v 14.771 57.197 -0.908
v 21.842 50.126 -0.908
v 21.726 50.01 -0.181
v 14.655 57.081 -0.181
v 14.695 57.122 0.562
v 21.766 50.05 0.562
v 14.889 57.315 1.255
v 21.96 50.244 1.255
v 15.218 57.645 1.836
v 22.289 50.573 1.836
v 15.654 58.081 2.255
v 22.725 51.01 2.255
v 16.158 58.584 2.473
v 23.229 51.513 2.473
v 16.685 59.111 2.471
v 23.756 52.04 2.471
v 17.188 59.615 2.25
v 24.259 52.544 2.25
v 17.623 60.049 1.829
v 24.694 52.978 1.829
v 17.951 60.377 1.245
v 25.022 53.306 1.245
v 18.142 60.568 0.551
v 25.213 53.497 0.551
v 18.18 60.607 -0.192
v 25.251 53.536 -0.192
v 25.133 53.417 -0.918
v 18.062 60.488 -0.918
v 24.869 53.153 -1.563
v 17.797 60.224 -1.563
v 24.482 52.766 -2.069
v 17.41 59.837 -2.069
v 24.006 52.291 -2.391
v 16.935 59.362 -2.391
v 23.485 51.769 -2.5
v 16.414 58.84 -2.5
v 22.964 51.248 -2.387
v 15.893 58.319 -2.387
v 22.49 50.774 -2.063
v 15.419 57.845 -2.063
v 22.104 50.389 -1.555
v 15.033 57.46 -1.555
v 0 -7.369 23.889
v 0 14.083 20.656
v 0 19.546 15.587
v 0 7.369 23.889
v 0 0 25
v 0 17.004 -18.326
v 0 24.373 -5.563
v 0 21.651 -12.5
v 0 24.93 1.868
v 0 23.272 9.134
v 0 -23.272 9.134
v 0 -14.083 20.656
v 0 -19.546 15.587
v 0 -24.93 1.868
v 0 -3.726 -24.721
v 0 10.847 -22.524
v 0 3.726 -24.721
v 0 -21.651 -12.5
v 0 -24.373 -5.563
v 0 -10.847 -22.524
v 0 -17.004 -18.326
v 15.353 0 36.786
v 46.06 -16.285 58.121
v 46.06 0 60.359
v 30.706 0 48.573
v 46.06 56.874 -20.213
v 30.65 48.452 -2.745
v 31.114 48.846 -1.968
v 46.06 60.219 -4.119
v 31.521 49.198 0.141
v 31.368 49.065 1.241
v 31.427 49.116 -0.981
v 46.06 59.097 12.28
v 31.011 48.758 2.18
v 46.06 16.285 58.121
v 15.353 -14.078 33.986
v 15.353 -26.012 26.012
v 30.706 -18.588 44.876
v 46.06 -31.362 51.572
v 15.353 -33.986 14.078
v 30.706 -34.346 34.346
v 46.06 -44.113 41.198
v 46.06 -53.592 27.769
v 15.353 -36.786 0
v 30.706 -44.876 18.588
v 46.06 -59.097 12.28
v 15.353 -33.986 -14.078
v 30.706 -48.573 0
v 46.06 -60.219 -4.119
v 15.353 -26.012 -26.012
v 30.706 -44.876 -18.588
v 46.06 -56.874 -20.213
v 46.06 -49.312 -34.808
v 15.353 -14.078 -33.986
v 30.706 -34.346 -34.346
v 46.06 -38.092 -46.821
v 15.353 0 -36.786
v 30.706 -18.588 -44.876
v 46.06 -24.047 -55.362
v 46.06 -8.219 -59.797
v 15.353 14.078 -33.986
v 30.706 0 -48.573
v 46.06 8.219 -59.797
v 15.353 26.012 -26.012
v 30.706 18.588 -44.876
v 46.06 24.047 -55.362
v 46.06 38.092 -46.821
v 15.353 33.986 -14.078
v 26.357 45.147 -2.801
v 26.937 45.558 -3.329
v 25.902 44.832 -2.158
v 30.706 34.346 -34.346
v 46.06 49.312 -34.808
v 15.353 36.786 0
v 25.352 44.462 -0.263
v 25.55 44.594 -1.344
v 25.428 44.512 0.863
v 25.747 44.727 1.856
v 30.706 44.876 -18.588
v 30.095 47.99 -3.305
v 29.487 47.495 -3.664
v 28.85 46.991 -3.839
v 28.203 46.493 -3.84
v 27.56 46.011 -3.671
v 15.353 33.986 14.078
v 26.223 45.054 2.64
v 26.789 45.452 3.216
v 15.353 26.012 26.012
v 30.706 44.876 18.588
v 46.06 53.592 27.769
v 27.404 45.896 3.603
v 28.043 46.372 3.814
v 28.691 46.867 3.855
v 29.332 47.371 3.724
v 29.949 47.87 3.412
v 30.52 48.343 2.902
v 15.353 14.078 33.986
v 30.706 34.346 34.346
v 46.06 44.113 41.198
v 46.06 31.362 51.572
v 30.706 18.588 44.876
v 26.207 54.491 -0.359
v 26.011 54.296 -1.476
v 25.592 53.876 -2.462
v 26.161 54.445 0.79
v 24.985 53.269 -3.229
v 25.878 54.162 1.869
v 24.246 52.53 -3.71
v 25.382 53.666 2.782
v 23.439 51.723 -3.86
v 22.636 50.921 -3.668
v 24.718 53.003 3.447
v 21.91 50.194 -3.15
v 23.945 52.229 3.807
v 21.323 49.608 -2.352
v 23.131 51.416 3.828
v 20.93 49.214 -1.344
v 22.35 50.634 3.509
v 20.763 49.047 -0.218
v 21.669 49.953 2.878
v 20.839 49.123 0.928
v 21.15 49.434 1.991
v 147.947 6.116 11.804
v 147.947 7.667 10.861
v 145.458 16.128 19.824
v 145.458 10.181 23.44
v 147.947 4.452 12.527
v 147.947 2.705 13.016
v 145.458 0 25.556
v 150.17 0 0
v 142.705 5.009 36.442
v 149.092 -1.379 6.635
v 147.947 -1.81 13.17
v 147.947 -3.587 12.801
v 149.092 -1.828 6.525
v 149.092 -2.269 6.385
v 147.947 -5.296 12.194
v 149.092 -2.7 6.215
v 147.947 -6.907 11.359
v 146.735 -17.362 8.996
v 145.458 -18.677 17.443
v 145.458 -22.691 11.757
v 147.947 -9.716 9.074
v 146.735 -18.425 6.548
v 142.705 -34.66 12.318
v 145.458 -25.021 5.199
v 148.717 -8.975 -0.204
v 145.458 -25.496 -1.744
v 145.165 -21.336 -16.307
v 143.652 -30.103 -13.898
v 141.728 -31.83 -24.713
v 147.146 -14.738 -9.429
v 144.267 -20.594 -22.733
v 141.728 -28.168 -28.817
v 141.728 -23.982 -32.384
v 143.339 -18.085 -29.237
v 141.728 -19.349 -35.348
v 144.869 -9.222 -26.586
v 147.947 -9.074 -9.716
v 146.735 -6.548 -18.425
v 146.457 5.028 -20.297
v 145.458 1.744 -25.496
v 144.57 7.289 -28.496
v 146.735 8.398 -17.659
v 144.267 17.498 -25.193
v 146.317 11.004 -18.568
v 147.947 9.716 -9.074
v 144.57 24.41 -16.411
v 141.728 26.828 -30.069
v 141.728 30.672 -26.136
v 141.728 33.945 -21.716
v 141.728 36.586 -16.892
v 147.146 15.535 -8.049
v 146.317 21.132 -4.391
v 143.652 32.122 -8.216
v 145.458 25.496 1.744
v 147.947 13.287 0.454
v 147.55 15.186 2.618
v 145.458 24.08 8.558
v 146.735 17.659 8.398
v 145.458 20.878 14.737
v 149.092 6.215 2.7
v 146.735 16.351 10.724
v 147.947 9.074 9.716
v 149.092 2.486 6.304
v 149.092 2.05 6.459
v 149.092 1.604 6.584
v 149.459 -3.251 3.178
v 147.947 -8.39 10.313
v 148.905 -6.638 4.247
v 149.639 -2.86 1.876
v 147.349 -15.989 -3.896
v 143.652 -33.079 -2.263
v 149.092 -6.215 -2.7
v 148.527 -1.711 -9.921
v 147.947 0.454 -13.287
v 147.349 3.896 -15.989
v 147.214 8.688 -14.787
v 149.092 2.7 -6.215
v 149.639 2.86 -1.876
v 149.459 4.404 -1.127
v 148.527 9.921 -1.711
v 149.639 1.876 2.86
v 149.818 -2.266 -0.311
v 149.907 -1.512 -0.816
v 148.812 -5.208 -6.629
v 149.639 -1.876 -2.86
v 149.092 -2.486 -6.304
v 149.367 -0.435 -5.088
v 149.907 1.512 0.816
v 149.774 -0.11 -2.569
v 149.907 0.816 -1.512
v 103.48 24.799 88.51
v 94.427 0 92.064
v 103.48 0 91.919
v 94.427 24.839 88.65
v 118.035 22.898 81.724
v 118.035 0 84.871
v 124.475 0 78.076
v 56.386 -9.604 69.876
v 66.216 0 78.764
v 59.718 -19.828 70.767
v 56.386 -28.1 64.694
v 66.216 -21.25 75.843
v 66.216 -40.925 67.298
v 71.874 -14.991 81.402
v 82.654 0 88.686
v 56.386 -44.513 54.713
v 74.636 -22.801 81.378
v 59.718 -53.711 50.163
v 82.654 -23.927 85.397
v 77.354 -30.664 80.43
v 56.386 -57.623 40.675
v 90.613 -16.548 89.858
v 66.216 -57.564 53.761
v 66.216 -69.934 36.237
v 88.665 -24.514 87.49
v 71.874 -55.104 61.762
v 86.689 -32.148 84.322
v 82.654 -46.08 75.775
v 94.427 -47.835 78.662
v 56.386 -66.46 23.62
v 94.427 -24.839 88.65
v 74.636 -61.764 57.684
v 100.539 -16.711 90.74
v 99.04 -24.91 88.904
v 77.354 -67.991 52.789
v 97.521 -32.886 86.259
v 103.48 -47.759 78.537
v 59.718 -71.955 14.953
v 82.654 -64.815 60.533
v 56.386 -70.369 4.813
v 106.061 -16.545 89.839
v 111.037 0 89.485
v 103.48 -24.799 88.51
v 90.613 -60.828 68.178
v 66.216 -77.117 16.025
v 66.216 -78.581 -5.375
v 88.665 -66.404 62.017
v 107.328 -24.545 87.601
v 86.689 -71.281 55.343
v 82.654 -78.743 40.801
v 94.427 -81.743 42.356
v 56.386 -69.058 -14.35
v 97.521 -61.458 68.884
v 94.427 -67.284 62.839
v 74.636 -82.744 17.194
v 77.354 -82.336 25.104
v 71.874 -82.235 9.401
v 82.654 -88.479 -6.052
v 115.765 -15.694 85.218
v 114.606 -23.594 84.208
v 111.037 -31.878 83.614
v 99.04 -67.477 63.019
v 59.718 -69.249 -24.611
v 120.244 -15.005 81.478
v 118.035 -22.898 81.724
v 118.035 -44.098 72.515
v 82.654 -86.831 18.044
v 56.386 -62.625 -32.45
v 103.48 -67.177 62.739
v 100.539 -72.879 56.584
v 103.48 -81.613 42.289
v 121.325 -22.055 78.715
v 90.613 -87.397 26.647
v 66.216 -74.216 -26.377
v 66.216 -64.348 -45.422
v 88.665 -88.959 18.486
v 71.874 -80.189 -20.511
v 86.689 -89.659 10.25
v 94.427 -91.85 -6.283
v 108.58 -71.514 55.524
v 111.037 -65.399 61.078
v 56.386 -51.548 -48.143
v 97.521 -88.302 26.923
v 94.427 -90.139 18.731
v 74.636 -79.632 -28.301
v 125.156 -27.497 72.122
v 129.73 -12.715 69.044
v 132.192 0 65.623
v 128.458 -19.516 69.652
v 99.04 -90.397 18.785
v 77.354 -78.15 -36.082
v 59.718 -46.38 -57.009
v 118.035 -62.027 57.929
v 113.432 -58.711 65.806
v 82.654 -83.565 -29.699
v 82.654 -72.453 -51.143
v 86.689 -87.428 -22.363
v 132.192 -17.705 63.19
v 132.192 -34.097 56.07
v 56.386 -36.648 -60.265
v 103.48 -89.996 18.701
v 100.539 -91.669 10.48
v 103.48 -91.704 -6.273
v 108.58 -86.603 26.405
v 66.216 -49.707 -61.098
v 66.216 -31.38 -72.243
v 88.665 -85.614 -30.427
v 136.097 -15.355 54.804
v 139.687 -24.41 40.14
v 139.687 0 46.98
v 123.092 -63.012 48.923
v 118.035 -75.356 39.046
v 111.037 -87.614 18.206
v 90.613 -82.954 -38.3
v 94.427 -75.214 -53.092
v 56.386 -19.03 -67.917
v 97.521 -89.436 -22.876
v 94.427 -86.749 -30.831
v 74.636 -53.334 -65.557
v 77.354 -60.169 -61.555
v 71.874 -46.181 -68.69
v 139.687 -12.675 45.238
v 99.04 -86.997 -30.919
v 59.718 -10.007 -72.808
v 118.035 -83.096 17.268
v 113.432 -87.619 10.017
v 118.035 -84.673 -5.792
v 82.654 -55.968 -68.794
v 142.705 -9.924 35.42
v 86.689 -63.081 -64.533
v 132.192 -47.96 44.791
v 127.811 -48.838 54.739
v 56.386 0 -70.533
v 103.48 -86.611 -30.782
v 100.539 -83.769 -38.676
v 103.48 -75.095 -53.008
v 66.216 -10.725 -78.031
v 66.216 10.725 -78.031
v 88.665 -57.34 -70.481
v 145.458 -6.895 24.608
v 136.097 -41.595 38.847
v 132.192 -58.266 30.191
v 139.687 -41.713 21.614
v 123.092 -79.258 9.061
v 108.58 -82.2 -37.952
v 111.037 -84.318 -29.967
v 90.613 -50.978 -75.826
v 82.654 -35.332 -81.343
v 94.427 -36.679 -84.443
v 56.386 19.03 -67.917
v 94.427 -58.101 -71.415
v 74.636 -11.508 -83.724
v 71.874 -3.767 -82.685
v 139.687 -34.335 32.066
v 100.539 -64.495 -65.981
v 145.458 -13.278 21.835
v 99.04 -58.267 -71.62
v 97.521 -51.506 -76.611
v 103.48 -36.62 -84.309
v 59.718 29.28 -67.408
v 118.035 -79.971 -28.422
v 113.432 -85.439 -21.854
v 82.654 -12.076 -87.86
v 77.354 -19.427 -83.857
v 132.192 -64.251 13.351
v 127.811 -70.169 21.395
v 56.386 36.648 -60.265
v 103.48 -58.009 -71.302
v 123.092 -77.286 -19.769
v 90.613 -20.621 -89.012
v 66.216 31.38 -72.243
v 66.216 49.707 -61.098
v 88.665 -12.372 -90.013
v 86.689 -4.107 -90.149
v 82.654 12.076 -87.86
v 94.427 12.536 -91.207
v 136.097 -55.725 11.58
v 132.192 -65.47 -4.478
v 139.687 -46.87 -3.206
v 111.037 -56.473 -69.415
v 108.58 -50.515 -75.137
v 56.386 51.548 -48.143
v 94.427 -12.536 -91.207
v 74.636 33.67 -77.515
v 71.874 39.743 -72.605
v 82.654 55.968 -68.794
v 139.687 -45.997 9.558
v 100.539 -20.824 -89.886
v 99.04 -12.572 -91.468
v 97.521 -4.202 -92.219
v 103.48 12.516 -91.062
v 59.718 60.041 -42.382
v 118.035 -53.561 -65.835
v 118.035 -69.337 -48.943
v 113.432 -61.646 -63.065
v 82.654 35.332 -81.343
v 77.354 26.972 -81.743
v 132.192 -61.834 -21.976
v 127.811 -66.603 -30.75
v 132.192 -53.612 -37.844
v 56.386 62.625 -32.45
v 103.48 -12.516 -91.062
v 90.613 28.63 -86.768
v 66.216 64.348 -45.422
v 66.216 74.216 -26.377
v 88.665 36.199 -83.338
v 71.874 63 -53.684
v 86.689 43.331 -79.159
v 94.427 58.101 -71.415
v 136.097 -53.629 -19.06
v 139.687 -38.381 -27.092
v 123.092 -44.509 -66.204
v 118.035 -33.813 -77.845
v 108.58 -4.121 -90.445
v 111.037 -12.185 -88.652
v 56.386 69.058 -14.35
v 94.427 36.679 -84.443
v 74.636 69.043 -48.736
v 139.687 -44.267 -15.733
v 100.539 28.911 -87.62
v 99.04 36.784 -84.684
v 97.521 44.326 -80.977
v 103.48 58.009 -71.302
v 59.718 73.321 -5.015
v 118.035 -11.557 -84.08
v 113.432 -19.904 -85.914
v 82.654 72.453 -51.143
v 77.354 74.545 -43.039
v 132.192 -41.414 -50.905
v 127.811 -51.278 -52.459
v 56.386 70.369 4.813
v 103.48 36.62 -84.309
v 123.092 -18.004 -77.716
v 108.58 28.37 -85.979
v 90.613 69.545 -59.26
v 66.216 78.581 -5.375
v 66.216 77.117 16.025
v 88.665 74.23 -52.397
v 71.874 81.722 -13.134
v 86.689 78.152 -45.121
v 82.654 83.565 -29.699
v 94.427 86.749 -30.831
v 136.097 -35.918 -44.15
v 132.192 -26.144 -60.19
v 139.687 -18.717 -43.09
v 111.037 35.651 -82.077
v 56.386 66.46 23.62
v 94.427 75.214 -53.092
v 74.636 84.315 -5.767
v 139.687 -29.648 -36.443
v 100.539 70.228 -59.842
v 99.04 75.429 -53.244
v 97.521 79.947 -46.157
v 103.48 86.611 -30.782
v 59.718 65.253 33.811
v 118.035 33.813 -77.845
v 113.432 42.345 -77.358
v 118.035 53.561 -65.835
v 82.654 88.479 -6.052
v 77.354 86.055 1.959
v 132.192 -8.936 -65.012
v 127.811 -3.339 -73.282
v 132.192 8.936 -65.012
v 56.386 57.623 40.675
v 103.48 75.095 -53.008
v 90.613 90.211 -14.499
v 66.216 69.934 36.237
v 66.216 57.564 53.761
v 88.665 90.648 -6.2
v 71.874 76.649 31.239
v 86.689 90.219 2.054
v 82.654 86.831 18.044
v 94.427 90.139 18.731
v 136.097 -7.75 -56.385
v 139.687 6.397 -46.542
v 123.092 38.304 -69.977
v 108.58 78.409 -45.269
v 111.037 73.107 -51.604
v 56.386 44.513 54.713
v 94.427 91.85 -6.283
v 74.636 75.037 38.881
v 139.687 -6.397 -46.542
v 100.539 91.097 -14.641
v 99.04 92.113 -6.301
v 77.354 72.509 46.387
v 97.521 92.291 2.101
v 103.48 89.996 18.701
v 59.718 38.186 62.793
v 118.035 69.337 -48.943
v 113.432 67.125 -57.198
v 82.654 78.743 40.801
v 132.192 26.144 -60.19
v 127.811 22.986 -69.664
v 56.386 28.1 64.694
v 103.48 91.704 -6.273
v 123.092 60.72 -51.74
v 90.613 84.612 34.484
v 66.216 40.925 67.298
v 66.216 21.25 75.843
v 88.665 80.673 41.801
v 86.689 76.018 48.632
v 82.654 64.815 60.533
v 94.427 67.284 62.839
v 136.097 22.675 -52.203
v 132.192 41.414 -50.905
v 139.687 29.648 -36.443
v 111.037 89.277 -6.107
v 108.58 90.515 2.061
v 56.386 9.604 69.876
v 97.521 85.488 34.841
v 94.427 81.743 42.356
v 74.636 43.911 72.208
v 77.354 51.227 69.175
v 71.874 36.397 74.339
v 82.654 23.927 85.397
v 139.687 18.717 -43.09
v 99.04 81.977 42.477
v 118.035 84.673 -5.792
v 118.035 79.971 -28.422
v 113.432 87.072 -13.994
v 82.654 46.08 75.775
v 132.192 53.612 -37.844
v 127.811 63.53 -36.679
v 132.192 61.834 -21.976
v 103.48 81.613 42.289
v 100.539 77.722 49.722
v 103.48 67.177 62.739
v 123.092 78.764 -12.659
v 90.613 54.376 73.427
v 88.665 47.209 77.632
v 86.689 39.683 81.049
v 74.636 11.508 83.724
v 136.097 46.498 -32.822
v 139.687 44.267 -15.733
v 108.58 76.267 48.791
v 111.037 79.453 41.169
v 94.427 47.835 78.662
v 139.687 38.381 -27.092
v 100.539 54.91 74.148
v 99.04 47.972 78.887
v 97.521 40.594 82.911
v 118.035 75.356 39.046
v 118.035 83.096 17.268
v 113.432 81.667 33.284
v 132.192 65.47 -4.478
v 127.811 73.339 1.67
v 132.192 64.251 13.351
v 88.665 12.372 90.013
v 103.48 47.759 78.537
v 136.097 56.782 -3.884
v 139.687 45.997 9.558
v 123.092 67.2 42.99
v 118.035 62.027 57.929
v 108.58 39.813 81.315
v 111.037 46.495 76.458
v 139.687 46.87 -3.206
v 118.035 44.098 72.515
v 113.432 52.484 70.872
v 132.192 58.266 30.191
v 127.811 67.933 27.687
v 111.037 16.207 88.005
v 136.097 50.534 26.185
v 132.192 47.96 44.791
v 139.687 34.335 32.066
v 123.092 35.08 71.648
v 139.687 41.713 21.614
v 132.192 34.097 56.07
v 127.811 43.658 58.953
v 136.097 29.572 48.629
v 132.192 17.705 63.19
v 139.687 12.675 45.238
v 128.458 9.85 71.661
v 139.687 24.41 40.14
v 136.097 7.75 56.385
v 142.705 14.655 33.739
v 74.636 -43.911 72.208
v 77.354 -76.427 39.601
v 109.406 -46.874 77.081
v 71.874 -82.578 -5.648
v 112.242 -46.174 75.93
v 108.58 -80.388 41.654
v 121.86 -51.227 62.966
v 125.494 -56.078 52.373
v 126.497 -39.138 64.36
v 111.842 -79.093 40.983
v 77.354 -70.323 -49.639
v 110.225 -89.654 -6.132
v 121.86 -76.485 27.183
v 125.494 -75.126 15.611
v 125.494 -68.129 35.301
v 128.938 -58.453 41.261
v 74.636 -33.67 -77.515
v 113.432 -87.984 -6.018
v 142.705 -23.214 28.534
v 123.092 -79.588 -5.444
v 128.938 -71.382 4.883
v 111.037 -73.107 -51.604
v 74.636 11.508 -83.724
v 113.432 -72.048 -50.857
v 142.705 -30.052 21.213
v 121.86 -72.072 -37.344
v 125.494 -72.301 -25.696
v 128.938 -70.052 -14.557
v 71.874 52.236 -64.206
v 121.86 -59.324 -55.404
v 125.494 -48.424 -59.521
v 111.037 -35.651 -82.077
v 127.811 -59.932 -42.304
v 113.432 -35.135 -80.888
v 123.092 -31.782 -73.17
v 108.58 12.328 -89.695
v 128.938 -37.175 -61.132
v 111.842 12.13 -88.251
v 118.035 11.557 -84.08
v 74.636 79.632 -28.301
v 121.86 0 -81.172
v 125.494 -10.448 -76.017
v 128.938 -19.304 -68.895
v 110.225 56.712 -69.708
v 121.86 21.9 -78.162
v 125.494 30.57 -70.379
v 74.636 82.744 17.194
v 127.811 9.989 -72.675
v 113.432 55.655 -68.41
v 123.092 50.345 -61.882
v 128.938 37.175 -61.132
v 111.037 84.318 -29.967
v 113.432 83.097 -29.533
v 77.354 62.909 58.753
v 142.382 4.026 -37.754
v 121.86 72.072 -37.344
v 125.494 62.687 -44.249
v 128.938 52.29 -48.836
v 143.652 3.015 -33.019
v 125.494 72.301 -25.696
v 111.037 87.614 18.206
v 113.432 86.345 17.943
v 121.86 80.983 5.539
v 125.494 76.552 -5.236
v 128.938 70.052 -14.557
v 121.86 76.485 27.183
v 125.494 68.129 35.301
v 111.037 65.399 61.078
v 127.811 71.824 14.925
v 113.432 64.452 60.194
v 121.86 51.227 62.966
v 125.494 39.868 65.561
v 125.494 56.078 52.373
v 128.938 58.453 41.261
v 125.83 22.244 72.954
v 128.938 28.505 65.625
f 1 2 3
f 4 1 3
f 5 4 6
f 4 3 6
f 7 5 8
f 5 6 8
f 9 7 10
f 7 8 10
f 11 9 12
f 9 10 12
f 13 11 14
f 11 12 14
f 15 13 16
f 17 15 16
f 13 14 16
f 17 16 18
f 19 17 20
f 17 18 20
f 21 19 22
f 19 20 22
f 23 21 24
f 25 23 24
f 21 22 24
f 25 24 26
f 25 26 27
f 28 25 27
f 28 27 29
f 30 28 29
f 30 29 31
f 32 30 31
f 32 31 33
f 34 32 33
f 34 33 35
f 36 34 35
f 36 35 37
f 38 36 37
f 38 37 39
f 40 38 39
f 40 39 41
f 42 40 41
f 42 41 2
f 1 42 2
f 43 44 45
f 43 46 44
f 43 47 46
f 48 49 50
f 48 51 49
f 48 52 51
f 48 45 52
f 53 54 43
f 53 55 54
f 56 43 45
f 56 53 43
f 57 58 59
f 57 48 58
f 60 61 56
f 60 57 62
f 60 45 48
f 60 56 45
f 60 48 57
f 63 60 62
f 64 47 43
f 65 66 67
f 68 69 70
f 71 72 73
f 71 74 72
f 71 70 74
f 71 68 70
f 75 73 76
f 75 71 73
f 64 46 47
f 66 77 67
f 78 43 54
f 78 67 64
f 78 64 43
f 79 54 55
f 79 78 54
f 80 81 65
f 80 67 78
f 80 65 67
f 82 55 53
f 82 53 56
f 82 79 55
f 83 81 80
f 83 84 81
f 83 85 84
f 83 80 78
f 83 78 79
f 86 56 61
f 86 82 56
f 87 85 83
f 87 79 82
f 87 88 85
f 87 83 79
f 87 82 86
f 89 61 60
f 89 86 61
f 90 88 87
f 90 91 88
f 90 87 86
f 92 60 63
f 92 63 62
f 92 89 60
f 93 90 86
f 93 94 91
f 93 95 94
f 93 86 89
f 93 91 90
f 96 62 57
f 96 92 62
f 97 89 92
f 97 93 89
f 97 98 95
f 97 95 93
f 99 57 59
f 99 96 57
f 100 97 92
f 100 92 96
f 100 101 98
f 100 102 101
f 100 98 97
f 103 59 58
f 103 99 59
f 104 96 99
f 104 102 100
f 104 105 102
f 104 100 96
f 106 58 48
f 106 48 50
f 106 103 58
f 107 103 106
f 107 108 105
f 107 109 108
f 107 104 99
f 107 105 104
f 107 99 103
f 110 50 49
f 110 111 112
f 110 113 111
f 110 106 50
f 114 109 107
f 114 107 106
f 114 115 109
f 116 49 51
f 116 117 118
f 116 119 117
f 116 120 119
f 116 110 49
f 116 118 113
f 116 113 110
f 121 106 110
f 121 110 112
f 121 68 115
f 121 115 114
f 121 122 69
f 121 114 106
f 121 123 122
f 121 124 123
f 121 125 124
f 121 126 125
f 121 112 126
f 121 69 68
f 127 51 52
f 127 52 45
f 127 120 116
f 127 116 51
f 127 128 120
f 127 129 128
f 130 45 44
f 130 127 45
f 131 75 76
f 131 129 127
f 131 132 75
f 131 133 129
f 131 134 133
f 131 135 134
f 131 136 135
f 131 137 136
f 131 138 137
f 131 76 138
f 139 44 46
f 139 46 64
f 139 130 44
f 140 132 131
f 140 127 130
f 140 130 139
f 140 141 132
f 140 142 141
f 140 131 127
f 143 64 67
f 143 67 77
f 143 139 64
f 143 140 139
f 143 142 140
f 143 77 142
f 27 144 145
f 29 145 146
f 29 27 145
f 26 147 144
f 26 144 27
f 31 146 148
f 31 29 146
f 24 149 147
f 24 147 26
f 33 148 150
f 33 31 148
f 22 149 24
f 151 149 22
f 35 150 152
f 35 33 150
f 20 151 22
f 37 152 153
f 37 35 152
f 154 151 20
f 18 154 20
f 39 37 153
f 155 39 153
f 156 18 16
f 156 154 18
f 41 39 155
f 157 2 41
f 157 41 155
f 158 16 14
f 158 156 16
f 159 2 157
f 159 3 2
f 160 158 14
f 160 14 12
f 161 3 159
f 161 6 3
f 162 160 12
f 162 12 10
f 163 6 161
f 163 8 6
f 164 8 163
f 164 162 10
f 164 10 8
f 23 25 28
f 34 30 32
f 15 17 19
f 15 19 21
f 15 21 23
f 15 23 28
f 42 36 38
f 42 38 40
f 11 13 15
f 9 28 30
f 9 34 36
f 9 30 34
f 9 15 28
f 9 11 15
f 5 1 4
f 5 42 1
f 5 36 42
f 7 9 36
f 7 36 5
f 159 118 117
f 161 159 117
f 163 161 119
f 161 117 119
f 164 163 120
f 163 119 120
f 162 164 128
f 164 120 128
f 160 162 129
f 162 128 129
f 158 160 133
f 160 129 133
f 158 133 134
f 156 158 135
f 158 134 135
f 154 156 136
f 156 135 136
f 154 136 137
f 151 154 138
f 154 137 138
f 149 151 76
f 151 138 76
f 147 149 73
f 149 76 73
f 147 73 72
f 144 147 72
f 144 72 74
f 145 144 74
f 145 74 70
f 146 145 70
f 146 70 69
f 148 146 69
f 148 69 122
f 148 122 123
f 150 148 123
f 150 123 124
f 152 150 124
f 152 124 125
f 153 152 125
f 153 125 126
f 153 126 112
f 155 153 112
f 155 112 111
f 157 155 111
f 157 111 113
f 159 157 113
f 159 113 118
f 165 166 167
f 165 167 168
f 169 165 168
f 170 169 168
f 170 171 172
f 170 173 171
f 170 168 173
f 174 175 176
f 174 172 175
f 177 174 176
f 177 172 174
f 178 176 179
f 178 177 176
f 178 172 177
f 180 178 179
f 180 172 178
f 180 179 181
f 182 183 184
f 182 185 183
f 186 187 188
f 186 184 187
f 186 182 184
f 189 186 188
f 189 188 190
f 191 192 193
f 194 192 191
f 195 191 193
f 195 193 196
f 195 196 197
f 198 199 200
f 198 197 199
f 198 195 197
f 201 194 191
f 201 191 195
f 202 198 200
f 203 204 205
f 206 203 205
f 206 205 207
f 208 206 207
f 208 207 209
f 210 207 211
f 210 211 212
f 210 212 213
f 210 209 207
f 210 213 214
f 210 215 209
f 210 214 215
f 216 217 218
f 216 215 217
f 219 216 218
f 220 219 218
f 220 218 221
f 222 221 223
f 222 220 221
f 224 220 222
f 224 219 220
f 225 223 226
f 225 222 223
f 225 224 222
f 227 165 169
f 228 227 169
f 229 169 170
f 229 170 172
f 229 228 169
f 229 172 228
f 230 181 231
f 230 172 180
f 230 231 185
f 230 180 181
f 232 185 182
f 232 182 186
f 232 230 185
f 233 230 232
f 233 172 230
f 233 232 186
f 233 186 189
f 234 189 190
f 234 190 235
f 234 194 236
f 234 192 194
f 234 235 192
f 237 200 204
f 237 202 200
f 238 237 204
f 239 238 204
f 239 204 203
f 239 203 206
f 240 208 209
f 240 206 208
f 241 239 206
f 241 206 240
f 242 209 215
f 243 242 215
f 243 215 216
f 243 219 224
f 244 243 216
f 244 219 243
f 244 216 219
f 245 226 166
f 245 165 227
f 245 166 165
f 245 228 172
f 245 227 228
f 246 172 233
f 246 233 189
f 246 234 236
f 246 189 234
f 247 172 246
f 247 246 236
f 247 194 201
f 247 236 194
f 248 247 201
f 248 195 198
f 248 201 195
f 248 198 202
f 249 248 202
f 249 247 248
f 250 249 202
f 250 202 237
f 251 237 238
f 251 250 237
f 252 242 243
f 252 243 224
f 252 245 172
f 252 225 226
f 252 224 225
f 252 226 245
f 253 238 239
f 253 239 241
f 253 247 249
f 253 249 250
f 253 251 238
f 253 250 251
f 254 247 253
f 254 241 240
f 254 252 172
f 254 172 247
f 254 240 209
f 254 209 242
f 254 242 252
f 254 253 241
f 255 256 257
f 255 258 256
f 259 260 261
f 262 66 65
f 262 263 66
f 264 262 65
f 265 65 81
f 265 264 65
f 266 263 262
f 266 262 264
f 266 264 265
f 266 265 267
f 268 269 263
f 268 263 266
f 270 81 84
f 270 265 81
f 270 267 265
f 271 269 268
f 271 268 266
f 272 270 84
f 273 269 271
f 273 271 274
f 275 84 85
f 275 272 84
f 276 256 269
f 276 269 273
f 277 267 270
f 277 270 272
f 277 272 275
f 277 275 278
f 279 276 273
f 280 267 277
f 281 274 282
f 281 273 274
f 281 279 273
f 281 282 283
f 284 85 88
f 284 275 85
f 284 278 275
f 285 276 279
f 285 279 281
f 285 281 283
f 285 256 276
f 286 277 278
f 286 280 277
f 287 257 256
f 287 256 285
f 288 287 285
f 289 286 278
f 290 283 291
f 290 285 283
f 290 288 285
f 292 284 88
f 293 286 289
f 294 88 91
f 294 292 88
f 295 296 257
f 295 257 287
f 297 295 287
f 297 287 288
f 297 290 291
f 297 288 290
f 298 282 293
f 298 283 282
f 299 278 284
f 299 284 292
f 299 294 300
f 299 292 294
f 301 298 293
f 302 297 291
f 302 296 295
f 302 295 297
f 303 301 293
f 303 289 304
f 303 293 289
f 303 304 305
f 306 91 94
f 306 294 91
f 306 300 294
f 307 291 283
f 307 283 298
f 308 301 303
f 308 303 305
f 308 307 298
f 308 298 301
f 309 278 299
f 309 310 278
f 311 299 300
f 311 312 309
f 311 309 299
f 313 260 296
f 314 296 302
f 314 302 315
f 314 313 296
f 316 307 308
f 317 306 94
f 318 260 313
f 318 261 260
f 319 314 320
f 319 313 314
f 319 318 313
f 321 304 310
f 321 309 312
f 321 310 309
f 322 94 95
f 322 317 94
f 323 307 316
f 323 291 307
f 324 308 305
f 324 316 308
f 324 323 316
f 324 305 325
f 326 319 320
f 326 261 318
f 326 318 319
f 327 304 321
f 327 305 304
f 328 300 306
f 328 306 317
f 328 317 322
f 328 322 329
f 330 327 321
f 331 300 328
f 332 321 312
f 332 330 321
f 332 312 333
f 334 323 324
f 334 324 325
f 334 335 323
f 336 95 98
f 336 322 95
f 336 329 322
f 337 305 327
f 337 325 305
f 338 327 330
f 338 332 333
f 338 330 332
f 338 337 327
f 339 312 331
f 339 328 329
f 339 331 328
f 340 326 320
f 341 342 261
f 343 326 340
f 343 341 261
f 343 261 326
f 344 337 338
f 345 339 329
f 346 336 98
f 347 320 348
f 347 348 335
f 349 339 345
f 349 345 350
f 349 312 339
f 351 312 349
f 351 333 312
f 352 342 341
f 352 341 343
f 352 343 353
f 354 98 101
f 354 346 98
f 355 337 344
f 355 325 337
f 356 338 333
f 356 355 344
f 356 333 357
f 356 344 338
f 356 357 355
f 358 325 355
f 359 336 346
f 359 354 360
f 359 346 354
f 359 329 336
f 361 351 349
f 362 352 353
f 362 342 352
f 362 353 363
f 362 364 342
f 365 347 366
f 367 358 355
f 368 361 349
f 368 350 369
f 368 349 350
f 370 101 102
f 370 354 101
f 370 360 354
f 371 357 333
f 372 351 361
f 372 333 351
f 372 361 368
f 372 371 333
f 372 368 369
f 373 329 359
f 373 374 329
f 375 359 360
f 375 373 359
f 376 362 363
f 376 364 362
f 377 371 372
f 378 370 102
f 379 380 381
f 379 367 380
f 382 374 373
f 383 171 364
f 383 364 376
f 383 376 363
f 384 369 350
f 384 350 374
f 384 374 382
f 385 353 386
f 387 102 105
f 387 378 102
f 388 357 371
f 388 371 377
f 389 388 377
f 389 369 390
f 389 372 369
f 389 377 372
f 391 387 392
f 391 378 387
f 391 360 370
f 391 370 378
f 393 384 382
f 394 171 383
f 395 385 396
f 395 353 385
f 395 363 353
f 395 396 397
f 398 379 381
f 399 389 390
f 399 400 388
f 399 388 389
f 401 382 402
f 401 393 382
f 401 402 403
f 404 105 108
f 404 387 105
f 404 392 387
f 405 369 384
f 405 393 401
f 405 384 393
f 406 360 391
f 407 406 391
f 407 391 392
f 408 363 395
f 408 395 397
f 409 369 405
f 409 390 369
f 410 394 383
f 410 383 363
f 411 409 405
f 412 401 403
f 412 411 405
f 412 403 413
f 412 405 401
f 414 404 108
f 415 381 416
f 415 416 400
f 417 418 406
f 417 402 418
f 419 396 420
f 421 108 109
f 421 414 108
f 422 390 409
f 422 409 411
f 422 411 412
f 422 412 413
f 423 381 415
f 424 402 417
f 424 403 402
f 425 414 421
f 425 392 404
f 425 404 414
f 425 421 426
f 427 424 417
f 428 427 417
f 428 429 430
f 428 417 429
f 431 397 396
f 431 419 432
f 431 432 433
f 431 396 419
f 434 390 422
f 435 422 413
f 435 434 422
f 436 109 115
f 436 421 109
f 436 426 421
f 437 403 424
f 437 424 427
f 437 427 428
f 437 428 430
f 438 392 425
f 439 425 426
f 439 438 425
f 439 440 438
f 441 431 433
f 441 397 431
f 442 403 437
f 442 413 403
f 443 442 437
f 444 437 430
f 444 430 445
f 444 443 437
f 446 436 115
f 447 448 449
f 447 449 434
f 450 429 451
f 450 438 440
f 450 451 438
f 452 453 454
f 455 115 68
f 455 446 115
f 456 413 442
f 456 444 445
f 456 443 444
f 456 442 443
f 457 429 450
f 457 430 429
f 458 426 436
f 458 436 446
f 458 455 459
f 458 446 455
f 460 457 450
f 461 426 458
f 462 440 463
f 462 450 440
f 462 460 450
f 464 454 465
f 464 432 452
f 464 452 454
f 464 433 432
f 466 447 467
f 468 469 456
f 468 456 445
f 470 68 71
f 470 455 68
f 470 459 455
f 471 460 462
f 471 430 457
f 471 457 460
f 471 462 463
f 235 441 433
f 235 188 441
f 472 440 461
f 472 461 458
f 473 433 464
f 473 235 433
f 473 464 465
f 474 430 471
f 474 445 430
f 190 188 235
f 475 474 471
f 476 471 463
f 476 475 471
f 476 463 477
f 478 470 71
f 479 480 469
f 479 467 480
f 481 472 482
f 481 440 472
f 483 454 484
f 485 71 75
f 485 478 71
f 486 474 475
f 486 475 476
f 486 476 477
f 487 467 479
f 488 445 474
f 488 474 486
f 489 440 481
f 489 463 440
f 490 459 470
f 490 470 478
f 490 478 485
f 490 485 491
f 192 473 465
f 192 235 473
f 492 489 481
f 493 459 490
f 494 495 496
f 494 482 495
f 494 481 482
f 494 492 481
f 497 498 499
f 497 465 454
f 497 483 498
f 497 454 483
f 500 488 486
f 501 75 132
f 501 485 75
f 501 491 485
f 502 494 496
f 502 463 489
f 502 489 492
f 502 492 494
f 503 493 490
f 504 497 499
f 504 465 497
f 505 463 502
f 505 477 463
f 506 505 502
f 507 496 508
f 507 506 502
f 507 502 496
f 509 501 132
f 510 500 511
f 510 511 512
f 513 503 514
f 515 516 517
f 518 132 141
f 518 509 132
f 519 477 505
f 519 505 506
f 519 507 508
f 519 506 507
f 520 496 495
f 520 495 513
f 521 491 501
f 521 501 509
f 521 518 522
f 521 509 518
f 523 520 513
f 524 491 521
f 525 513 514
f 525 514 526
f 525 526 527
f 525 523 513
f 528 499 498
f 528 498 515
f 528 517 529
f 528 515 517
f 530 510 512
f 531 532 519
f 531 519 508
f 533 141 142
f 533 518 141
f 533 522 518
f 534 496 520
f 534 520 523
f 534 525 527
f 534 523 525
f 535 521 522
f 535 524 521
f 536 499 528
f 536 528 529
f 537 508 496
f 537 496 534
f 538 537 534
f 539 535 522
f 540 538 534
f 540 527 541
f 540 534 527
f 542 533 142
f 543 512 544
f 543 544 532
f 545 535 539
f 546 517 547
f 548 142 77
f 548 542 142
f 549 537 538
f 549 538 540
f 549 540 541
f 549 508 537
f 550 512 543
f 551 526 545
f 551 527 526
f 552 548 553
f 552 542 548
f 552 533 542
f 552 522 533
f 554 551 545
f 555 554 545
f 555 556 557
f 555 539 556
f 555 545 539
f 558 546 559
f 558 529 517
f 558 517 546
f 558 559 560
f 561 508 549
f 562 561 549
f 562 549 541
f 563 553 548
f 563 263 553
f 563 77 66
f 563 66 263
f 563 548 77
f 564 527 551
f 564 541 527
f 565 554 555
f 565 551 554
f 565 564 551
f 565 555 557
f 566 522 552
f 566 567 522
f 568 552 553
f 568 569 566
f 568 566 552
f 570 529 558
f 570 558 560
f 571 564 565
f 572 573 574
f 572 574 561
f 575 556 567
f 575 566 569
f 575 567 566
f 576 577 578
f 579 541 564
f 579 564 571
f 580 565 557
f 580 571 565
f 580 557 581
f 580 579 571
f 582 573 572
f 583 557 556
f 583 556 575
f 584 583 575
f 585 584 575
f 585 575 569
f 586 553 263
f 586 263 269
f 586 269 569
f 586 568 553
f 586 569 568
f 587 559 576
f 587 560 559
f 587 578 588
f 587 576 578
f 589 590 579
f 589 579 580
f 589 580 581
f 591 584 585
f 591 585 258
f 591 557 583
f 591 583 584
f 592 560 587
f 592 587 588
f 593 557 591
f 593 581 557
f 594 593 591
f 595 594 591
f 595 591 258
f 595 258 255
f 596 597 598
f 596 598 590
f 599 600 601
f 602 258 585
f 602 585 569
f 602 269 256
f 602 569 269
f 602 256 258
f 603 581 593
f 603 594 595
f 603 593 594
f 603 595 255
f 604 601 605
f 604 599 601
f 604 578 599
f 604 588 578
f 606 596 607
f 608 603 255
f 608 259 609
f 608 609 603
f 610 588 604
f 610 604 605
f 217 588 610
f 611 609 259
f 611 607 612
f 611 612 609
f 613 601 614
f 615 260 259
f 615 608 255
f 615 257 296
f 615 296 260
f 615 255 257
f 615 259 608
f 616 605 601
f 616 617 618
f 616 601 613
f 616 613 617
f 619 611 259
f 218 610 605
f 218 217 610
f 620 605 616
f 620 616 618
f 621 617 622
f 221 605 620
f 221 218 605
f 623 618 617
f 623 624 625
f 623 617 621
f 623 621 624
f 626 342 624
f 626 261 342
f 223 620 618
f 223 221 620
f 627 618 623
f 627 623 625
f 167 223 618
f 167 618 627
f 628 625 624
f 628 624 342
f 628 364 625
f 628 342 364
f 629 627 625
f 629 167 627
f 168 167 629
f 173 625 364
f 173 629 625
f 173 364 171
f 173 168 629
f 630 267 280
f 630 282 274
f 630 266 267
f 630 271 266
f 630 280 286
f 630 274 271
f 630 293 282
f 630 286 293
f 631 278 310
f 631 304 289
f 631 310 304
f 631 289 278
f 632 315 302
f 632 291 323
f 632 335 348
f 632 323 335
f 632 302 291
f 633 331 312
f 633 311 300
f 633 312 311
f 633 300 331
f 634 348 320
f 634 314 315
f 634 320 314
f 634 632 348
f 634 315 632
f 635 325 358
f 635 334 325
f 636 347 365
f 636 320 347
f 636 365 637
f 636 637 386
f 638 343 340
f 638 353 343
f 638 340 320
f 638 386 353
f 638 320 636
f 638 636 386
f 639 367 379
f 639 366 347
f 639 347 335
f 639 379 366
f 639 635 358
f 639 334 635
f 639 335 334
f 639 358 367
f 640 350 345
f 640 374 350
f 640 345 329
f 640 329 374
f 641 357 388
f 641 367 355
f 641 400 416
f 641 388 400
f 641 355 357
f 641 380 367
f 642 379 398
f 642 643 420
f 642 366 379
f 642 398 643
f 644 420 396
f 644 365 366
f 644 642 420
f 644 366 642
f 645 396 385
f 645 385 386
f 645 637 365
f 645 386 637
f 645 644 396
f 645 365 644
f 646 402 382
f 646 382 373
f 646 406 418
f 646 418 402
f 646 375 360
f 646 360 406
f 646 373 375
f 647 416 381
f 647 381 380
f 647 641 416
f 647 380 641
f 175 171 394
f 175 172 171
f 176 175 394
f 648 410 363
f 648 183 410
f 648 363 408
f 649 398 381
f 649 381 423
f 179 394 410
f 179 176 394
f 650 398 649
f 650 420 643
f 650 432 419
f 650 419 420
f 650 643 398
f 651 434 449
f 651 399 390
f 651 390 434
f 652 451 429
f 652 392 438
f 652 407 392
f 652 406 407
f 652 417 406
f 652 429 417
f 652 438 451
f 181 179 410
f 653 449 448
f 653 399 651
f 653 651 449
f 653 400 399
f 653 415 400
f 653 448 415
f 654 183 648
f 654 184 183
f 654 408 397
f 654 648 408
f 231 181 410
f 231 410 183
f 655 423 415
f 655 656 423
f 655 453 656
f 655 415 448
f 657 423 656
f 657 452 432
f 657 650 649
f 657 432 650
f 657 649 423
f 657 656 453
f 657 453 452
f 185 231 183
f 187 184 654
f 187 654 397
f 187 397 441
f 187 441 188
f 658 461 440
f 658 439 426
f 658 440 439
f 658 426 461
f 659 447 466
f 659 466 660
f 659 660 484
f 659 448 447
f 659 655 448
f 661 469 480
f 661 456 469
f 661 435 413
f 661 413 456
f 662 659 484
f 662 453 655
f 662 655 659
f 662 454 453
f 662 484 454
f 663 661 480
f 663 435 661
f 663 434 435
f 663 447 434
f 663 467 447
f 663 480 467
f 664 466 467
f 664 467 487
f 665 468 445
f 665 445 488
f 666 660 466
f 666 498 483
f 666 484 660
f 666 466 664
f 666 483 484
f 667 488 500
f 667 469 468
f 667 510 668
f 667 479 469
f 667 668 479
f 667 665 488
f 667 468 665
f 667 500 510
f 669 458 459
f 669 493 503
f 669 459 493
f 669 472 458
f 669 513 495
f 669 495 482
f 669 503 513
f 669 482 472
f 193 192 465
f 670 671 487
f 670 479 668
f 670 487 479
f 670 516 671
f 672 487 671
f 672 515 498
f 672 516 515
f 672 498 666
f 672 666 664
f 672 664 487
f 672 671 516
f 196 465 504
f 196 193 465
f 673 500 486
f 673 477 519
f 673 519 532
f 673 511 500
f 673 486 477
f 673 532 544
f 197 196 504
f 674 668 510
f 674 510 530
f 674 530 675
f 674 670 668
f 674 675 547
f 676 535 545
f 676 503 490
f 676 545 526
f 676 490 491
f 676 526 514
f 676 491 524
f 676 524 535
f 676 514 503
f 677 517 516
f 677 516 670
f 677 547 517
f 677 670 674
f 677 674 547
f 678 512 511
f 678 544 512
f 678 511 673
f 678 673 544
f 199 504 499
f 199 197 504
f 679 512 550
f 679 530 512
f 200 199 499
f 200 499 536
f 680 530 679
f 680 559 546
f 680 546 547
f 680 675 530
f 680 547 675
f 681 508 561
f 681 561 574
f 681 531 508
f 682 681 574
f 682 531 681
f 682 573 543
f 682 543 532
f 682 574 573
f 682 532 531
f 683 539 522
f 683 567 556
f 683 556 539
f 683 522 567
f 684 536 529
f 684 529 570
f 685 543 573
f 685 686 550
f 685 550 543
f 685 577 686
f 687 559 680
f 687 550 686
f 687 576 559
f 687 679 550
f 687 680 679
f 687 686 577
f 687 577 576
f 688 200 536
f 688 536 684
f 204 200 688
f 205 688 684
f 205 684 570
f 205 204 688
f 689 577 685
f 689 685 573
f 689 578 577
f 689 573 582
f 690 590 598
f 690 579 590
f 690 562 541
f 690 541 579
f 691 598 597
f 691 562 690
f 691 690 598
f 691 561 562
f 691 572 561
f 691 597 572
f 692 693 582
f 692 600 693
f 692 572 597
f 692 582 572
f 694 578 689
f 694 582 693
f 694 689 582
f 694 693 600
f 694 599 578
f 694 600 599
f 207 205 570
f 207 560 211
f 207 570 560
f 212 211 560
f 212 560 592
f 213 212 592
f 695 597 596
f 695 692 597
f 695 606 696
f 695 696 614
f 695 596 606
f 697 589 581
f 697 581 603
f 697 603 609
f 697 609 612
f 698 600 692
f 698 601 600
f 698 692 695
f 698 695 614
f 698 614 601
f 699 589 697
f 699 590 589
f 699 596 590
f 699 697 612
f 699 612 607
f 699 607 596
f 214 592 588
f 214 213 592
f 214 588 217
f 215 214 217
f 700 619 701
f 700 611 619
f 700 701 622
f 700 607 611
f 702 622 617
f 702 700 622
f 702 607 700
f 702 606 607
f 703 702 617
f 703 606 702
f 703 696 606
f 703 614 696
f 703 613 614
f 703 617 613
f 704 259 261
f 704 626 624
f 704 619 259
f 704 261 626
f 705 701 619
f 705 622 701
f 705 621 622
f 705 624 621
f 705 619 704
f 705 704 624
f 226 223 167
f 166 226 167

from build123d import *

# Parameters (mm, degrees)
CROQUIS3_R              = 2.5
SALIENTE_EXTRUIR1_DEPTH = 30
CROQUIS4_R              = 3.860951782
SALIENTE_EXTRUIR2_DEPTH = 20


with BuildPart() as part:
    # Croquis2 → Revolución1 (revolve)
    with BuildSketch(Plane.XY, mode=Mode.PRIVATE) as revoluci_n1_sk:
        with BuildLine():
            Line((0, 0), (0, 25))
            Line((0, 25), (46.059604384, 60.359357843))
            add(Edge.make_bspline(
                [(46.059604384, 60.359357843), (127.957826231, 146.665270252), (150.170471105, 0)],
                knots=[0, 0, 0, 1, 1, 1], degree=2))
            Line((150.170471105, 0), (0, 0))
        make_face()
    revolve(revoluci_n1_sk.sketch.rotate(Axis((0, 0, 0), (1, 0, 0)), 90), axis=Axis((0, 0, 0), (1, 0, 0)))

    # Croquis3 → Saliente-Extruir1 (add)
    with BuildSketch(Plane(origin=(0, 0, 0), x_dir=(0.7071067811865477, 0.7071067811865475, 0), z_dir=(-0.7071067811865475, 0.7071067811865477, 0))):
        with Locations(Location((53.218213551, 0, 0), (0, 0, 158.694408868))):
            Circle(CROQUIS3_R)
    extrude(amount=SALIENTE_EXTRUIR1_DEPTH)

    # Croquis4 → Saliente-Extruir2 (add)
    with BuildSketch(Plane(origin=(0, 0, 0), x_dir=(0.7071067811865477, 0.7071067811865475, 0), z_dir=(-0.7071067811865475, 0.7071067811865477, 0))):
        with Locations(Location((53.218213551, 0, 0), (0, 0, 159.621887119))):
            Circle(CROQUIS4_R)
    extrude(amount=SALIENTE_EXTRUIR2_DEPTH)


solid = part.part
